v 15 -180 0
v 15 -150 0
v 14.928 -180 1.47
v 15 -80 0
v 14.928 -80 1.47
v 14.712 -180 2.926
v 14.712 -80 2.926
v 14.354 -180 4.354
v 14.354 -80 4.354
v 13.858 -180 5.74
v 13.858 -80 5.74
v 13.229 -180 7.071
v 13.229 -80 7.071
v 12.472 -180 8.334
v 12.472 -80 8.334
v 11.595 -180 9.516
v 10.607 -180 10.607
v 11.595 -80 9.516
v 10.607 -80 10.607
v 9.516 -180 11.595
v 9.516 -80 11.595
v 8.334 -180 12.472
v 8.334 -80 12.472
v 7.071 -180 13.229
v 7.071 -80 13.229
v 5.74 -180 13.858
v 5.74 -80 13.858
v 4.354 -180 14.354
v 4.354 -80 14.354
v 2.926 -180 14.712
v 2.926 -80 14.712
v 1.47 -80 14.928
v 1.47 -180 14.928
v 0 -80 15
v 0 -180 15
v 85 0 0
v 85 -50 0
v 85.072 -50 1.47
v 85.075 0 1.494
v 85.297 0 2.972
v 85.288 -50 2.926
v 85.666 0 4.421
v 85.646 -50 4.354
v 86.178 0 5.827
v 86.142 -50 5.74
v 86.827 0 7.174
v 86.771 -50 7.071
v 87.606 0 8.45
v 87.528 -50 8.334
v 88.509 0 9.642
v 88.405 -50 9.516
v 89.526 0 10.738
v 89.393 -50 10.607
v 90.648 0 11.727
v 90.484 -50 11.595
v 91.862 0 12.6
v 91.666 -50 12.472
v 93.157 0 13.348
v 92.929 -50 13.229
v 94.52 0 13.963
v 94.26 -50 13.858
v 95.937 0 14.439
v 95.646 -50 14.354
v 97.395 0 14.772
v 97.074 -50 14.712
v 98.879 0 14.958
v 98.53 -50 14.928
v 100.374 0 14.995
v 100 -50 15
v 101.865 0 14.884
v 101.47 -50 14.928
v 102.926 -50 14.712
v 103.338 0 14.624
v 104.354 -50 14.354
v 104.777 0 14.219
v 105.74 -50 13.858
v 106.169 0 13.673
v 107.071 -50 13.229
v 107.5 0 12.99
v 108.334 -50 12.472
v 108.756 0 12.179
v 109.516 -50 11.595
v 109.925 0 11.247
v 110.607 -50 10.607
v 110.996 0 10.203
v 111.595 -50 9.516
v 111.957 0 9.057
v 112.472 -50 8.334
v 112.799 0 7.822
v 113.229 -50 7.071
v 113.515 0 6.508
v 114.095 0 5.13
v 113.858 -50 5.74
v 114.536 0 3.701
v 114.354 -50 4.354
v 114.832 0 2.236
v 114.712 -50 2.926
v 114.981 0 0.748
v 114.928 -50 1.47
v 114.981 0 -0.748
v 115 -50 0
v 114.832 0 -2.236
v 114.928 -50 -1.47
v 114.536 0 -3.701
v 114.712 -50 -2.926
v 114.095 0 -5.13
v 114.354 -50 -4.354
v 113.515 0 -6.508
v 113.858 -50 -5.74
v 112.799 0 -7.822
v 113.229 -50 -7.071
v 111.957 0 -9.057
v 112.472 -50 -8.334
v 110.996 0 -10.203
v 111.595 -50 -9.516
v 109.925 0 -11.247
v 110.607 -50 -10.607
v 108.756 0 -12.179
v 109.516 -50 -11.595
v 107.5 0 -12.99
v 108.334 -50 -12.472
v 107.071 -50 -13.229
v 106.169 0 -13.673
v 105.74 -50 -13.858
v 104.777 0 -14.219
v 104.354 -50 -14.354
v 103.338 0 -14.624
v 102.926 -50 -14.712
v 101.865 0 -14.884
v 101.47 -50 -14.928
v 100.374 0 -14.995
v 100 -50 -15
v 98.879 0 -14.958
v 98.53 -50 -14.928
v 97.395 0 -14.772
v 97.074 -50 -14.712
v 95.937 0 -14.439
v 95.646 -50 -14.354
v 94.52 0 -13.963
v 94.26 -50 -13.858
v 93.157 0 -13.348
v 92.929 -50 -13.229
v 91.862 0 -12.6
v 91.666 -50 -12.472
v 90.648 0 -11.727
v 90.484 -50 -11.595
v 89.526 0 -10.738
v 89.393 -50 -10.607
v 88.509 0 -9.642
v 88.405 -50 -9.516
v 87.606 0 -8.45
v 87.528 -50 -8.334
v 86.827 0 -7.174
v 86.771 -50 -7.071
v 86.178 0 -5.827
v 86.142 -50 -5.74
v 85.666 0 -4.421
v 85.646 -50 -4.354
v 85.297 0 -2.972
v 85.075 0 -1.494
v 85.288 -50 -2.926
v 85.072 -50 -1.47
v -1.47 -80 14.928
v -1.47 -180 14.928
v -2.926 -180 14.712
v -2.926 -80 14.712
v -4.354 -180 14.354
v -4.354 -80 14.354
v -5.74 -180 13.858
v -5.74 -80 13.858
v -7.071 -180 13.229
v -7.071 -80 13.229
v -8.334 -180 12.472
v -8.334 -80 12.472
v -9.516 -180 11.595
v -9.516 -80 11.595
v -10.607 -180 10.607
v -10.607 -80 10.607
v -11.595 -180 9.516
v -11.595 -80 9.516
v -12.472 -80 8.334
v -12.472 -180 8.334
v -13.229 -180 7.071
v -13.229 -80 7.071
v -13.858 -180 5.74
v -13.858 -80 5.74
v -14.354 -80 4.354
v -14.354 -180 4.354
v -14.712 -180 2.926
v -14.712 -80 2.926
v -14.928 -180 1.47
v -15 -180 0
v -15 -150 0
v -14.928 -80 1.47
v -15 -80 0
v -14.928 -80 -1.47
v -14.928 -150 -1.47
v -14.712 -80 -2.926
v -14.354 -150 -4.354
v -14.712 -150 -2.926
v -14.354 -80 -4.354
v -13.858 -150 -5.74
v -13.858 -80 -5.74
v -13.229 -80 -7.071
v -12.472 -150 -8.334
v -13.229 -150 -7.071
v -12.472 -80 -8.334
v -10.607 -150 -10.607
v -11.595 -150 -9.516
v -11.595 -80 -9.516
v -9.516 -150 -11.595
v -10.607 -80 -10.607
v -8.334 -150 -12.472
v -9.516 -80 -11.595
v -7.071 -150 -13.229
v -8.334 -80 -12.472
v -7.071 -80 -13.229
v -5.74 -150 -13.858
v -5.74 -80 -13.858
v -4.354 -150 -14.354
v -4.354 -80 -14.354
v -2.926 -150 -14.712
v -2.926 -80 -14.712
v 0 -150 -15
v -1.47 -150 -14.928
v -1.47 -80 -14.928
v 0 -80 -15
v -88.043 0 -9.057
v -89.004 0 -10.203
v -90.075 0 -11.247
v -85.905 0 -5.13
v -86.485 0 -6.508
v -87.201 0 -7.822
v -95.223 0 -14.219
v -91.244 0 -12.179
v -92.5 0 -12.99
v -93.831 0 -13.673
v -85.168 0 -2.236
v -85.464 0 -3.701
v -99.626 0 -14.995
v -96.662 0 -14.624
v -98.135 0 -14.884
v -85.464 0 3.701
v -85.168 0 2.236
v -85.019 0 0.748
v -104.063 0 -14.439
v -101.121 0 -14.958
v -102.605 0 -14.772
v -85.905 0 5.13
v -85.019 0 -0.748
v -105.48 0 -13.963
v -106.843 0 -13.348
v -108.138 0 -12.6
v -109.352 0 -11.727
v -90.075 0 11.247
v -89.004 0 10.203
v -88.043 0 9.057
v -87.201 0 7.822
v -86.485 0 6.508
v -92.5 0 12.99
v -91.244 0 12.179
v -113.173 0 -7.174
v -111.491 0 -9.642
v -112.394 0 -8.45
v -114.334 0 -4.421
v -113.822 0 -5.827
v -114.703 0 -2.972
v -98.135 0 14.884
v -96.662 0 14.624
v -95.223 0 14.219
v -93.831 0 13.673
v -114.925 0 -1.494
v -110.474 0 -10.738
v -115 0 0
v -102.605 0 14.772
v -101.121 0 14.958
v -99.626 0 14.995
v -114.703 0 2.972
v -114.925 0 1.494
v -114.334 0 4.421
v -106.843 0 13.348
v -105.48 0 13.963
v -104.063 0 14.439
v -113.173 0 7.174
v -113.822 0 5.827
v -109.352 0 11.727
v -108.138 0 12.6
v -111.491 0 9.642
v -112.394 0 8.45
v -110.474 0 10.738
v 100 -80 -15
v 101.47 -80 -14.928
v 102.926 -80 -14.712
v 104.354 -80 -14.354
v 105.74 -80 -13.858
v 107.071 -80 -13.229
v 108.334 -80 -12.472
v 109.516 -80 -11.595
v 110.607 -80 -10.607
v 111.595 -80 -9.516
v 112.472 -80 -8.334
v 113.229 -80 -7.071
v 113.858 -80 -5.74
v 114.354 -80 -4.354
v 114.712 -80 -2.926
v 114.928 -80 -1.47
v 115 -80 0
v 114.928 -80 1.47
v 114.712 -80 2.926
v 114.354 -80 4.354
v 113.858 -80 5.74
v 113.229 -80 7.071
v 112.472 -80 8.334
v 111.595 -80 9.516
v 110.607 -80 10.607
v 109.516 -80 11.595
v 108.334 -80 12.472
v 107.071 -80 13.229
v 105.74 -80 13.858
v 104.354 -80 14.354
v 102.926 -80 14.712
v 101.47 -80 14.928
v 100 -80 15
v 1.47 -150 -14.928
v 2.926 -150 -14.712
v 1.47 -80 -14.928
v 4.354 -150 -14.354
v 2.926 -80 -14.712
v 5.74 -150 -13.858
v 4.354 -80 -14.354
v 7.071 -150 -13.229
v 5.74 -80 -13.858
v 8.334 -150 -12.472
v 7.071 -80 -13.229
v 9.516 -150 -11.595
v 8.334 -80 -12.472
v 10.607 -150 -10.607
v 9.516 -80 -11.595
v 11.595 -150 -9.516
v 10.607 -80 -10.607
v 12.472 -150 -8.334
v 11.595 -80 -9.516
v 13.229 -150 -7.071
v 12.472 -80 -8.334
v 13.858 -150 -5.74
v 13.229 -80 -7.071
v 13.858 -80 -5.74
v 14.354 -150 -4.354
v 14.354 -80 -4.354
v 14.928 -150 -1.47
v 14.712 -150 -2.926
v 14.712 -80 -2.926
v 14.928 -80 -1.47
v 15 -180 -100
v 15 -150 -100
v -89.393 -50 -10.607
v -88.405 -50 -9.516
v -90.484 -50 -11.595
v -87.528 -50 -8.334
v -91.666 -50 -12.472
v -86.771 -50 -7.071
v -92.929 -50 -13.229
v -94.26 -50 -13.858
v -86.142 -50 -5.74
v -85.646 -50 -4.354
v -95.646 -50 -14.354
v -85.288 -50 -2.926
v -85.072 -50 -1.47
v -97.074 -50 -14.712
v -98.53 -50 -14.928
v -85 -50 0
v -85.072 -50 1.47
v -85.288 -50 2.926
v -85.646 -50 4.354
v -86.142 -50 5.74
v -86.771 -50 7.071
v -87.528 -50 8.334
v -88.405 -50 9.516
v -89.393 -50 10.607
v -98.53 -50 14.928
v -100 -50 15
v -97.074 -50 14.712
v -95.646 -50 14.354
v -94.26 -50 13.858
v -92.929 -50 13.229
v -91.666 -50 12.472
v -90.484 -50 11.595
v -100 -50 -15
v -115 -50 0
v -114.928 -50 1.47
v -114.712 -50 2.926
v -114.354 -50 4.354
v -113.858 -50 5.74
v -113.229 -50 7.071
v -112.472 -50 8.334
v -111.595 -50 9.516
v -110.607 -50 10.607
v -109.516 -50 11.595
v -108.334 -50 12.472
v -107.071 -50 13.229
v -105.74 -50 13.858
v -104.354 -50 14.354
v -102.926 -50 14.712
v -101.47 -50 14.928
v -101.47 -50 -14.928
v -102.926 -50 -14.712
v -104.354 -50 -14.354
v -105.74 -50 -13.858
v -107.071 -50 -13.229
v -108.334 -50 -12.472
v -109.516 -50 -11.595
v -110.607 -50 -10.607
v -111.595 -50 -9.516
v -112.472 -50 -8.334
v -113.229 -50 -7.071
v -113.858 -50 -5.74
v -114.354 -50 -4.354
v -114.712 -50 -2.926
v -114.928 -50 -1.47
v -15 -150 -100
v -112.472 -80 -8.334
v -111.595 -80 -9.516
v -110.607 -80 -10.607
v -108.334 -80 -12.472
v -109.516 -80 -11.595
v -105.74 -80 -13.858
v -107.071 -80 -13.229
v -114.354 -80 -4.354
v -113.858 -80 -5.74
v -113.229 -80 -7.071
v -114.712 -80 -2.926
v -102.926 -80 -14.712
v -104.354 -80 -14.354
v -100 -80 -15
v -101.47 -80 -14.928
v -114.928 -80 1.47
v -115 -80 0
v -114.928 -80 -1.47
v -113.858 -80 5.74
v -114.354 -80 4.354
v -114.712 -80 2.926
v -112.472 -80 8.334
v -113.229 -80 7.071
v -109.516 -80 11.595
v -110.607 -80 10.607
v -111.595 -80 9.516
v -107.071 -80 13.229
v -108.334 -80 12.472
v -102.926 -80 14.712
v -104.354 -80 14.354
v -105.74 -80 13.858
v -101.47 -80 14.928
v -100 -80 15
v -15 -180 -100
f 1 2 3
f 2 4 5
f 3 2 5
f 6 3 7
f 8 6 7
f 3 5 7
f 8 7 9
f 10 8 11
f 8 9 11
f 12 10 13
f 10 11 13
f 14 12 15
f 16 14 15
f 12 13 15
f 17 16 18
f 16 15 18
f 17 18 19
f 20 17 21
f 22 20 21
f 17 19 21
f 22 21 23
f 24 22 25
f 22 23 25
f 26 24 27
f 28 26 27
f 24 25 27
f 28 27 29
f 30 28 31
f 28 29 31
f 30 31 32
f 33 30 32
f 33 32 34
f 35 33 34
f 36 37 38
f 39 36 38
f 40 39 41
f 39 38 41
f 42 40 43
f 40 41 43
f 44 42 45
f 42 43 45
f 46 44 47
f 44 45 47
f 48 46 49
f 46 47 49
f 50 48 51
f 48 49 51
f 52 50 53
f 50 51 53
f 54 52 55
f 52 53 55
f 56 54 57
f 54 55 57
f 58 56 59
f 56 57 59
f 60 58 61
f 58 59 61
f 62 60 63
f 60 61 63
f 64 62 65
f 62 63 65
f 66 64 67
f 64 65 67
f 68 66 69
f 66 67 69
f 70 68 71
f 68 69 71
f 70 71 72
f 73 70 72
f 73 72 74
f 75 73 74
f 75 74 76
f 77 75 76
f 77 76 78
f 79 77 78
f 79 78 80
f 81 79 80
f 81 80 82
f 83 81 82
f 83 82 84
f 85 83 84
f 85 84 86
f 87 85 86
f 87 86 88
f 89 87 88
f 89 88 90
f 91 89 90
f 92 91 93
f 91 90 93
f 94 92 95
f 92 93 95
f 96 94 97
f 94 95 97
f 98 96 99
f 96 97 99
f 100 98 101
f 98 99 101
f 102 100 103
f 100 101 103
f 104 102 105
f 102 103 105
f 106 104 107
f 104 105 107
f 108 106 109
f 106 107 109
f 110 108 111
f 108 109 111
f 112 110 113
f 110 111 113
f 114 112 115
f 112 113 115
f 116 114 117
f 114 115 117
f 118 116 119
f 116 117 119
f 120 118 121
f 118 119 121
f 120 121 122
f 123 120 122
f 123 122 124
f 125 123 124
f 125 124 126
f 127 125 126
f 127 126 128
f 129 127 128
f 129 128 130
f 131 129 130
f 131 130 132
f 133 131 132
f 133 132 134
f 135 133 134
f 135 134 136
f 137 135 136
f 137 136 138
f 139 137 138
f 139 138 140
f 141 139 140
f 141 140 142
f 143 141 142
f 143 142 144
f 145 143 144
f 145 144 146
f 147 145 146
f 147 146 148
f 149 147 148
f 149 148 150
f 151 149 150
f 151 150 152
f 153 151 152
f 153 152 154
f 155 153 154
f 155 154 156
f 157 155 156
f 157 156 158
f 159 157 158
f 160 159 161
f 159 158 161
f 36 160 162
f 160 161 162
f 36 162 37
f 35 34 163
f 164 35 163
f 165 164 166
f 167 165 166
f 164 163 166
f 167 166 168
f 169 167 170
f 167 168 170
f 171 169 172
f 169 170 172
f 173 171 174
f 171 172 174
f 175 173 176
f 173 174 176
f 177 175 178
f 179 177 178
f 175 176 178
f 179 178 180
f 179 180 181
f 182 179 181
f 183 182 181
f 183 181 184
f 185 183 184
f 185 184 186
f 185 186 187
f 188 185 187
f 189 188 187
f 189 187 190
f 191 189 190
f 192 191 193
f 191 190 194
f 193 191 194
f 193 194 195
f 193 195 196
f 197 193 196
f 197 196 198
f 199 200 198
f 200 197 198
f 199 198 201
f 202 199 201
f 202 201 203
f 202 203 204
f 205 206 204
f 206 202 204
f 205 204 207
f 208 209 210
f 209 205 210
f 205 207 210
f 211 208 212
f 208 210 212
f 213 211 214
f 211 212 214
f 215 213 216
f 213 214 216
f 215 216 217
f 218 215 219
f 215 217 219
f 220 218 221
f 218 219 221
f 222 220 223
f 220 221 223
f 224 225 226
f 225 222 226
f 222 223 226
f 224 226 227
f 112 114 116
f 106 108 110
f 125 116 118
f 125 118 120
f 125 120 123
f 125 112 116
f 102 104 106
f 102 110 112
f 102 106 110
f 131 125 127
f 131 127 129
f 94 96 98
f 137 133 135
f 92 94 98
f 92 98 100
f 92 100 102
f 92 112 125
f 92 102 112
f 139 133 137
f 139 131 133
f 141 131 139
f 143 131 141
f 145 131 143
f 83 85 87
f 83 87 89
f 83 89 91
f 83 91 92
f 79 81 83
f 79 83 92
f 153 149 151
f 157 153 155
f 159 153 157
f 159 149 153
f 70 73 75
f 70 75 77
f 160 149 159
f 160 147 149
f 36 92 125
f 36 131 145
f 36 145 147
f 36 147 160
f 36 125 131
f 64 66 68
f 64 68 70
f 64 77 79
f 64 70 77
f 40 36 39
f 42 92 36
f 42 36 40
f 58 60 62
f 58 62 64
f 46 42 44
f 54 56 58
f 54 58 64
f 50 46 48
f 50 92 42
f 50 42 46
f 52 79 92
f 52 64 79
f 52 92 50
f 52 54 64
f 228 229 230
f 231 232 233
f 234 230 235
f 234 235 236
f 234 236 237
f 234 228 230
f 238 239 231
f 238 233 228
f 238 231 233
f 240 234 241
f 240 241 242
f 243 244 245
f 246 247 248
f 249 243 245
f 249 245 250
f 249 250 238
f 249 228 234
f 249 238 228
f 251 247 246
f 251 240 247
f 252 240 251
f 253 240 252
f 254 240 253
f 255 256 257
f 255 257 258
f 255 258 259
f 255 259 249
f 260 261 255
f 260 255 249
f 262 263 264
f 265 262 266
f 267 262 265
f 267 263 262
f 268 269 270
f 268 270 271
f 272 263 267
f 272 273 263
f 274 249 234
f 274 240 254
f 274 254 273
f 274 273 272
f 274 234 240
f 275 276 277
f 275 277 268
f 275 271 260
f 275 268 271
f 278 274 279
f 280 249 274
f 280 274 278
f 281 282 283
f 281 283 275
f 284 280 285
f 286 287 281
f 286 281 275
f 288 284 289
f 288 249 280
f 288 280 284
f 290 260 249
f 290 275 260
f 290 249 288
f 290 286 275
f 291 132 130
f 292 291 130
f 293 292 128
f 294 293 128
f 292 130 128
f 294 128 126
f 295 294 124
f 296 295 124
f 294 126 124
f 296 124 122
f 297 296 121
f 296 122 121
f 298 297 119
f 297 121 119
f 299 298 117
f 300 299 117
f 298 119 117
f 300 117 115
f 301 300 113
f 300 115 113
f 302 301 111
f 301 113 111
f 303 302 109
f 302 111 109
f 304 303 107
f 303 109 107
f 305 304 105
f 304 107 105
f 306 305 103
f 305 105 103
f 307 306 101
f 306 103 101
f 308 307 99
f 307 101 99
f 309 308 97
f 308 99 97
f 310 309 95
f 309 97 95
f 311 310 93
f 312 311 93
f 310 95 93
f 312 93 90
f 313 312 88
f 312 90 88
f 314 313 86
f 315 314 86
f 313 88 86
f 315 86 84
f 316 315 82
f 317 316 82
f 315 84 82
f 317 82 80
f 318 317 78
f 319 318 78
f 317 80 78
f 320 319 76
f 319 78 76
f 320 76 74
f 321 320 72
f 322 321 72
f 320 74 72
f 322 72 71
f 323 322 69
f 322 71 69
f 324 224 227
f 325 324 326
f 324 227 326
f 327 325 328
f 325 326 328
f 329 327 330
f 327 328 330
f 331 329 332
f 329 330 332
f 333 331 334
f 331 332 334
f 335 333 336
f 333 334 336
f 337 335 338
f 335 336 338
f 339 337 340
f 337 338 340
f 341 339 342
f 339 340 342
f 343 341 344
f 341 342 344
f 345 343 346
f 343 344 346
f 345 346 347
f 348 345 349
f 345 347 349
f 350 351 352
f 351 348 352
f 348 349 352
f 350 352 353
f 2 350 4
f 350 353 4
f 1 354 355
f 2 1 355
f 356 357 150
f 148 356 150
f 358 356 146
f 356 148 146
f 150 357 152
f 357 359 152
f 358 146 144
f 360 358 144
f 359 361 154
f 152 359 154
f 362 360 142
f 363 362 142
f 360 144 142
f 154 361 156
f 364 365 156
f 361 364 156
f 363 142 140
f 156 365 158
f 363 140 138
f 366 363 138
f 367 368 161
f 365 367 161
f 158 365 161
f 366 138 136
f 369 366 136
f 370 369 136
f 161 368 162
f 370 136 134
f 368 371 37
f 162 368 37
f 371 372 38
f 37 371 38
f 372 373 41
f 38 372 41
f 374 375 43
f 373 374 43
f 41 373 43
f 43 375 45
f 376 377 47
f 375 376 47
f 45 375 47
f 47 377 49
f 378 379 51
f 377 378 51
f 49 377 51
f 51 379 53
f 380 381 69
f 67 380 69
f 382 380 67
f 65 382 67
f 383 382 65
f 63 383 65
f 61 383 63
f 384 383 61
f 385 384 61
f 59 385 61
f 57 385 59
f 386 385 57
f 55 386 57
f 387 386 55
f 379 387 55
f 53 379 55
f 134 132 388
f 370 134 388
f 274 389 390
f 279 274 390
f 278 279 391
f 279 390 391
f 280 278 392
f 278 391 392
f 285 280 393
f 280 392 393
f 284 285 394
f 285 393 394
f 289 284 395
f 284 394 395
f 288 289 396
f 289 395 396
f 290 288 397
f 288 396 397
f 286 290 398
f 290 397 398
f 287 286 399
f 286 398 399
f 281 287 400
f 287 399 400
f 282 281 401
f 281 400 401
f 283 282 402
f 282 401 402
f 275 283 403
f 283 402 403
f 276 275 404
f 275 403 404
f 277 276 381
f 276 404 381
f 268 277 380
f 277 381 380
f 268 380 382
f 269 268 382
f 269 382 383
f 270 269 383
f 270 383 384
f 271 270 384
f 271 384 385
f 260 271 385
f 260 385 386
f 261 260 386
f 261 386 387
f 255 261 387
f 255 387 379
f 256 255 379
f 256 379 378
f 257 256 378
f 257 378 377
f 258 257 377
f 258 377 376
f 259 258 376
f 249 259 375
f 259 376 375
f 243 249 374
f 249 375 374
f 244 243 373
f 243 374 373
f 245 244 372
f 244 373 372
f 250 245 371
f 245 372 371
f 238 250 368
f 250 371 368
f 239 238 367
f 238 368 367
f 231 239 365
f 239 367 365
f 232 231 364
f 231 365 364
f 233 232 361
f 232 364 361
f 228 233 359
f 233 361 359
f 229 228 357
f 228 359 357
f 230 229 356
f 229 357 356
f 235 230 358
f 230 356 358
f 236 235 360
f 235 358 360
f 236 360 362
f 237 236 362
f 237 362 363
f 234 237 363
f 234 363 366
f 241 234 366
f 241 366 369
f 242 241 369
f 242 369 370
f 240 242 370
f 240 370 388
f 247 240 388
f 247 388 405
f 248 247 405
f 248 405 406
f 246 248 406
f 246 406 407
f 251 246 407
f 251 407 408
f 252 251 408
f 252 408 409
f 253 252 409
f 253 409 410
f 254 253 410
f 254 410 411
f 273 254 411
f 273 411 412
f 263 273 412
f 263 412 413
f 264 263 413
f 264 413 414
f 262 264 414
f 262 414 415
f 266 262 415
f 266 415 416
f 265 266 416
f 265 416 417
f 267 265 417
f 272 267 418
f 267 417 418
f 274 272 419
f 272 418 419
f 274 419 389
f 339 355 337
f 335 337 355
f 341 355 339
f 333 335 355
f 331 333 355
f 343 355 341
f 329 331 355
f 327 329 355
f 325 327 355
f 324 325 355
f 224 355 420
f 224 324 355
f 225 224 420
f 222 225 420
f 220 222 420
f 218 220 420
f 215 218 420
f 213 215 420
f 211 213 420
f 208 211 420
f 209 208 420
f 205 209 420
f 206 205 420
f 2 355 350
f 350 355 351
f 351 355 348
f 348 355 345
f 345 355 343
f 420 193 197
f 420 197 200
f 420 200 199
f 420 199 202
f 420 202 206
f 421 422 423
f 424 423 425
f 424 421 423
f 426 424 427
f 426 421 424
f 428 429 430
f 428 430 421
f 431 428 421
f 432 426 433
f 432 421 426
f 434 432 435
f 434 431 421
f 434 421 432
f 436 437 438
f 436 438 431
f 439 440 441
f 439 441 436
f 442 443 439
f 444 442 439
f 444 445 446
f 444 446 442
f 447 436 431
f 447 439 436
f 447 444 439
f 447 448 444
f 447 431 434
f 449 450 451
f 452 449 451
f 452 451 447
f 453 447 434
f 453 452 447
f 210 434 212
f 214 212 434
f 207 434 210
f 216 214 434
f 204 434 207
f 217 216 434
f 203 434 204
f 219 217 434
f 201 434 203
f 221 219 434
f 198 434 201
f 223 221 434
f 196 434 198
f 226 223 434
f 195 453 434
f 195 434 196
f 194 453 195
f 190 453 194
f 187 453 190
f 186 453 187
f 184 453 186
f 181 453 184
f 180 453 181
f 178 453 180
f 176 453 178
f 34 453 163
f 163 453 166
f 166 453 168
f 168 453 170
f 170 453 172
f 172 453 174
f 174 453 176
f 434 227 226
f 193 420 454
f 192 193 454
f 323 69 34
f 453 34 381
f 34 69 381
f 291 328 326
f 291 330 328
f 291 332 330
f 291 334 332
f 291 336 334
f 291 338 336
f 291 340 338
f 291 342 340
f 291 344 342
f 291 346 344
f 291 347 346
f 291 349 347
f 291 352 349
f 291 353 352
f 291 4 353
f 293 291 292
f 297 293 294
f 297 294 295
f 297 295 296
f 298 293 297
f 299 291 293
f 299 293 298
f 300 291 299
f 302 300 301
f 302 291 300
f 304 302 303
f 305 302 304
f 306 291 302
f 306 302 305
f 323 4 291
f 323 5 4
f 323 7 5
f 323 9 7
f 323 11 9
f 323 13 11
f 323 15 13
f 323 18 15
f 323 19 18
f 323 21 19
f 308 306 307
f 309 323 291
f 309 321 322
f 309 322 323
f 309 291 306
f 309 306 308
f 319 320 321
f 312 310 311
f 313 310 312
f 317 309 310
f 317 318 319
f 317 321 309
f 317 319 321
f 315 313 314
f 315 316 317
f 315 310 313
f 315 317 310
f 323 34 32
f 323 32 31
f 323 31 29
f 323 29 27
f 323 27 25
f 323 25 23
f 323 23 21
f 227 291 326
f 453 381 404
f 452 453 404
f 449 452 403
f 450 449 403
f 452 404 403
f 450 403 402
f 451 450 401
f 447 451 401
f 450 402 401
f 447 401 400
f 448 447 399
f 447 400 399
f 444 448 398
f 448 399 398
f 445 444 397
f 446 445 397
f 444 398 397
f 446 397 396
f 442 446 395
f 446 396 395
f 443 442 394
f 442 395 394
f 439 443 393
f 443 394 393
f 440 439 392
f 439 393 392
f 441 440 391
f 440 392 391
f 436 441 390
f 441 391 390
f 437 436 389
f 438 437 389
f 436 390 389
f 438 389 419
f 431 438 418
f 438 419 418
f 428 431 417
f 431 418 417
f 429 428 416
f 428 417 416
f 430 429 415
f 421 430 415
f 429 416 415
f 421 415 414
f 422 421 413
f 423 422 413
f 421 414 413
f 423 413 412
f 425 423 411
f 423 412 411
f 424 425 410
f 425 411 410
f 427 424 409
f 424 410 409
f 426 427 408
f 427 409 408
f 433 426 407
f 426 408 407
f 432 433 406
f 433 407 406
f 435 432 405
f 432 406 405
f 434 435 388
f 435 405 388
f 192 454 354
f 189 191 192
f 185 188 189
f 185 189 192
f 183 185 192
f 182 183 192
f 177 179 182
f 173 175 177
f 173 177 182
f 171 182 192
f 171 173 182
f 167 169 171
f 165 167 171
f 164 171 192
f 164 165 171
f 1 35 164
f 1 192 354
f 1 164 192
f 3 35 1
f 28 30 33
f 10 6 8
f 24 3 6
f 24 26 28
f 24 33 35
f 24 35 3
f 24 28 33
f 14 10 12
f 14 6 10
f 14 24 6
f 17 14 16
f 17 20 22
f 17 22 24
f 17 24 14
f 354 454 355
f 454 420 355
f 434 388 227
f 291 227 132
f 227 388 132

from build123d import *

# Parameters (mm, degrees)
F2_DEPTH = 30
F4_DEPTH = 100
F6_R     = 15
F7_DEPTH = 50
F9_DEPTH = 100


with BuildPart() as f2:
    # F1 (on offset) → F2 (new body)
    with BuildSketch(Plane.XZ.offset(50)):
        with BuildLine():
            Line((100, 15), (-100, 15))
            ThreePointArc((-100, 15), (-115, 0), (-100, -15))
            Line((-100, -15), (100, -15))
            ThreePointArc((100, -15), (115, 0), (100, 15))
        make_face()
    extrude(amount=F2_DEPTH)

    # F3 (on face) → F4 (join)
    with BuildSketch(Plane.XZ.offset(80)):
        with BuildLine():
            ThreePointArc((0, -15), (10.606602, -10.606602), (15, 0))
            ThreePointArc((15, 0), (10.606602, 10.606602), (0, 15))
            ThreePointArc((0, 15), (-15, 0), (0, -15))
        make_face()
    extrude(amount=F4_DEPTH)

    # F6 (on face) → F7 (join)
    with BuildSketch(Plane(origin=(0, -50, 0), x_dir=(-1, 0, 0), z_dir=(0, 1, 0))):
        with Locations((-100, 0)):
            Circle(F6_R)
        with Locations((100, 0)):
            Circle(F6_R)
    extrude(amount=F7_DEPTH)

    # F8 (on Top) → F9 (join)
    with BuildSketch(Plane.XY):
        Polygon((-15, -180), (0, -180), (15, -180), (15, -150), (-15, -150), align=None)
    extrude(amount=-F9_DEPTH)


solid = f2.part
